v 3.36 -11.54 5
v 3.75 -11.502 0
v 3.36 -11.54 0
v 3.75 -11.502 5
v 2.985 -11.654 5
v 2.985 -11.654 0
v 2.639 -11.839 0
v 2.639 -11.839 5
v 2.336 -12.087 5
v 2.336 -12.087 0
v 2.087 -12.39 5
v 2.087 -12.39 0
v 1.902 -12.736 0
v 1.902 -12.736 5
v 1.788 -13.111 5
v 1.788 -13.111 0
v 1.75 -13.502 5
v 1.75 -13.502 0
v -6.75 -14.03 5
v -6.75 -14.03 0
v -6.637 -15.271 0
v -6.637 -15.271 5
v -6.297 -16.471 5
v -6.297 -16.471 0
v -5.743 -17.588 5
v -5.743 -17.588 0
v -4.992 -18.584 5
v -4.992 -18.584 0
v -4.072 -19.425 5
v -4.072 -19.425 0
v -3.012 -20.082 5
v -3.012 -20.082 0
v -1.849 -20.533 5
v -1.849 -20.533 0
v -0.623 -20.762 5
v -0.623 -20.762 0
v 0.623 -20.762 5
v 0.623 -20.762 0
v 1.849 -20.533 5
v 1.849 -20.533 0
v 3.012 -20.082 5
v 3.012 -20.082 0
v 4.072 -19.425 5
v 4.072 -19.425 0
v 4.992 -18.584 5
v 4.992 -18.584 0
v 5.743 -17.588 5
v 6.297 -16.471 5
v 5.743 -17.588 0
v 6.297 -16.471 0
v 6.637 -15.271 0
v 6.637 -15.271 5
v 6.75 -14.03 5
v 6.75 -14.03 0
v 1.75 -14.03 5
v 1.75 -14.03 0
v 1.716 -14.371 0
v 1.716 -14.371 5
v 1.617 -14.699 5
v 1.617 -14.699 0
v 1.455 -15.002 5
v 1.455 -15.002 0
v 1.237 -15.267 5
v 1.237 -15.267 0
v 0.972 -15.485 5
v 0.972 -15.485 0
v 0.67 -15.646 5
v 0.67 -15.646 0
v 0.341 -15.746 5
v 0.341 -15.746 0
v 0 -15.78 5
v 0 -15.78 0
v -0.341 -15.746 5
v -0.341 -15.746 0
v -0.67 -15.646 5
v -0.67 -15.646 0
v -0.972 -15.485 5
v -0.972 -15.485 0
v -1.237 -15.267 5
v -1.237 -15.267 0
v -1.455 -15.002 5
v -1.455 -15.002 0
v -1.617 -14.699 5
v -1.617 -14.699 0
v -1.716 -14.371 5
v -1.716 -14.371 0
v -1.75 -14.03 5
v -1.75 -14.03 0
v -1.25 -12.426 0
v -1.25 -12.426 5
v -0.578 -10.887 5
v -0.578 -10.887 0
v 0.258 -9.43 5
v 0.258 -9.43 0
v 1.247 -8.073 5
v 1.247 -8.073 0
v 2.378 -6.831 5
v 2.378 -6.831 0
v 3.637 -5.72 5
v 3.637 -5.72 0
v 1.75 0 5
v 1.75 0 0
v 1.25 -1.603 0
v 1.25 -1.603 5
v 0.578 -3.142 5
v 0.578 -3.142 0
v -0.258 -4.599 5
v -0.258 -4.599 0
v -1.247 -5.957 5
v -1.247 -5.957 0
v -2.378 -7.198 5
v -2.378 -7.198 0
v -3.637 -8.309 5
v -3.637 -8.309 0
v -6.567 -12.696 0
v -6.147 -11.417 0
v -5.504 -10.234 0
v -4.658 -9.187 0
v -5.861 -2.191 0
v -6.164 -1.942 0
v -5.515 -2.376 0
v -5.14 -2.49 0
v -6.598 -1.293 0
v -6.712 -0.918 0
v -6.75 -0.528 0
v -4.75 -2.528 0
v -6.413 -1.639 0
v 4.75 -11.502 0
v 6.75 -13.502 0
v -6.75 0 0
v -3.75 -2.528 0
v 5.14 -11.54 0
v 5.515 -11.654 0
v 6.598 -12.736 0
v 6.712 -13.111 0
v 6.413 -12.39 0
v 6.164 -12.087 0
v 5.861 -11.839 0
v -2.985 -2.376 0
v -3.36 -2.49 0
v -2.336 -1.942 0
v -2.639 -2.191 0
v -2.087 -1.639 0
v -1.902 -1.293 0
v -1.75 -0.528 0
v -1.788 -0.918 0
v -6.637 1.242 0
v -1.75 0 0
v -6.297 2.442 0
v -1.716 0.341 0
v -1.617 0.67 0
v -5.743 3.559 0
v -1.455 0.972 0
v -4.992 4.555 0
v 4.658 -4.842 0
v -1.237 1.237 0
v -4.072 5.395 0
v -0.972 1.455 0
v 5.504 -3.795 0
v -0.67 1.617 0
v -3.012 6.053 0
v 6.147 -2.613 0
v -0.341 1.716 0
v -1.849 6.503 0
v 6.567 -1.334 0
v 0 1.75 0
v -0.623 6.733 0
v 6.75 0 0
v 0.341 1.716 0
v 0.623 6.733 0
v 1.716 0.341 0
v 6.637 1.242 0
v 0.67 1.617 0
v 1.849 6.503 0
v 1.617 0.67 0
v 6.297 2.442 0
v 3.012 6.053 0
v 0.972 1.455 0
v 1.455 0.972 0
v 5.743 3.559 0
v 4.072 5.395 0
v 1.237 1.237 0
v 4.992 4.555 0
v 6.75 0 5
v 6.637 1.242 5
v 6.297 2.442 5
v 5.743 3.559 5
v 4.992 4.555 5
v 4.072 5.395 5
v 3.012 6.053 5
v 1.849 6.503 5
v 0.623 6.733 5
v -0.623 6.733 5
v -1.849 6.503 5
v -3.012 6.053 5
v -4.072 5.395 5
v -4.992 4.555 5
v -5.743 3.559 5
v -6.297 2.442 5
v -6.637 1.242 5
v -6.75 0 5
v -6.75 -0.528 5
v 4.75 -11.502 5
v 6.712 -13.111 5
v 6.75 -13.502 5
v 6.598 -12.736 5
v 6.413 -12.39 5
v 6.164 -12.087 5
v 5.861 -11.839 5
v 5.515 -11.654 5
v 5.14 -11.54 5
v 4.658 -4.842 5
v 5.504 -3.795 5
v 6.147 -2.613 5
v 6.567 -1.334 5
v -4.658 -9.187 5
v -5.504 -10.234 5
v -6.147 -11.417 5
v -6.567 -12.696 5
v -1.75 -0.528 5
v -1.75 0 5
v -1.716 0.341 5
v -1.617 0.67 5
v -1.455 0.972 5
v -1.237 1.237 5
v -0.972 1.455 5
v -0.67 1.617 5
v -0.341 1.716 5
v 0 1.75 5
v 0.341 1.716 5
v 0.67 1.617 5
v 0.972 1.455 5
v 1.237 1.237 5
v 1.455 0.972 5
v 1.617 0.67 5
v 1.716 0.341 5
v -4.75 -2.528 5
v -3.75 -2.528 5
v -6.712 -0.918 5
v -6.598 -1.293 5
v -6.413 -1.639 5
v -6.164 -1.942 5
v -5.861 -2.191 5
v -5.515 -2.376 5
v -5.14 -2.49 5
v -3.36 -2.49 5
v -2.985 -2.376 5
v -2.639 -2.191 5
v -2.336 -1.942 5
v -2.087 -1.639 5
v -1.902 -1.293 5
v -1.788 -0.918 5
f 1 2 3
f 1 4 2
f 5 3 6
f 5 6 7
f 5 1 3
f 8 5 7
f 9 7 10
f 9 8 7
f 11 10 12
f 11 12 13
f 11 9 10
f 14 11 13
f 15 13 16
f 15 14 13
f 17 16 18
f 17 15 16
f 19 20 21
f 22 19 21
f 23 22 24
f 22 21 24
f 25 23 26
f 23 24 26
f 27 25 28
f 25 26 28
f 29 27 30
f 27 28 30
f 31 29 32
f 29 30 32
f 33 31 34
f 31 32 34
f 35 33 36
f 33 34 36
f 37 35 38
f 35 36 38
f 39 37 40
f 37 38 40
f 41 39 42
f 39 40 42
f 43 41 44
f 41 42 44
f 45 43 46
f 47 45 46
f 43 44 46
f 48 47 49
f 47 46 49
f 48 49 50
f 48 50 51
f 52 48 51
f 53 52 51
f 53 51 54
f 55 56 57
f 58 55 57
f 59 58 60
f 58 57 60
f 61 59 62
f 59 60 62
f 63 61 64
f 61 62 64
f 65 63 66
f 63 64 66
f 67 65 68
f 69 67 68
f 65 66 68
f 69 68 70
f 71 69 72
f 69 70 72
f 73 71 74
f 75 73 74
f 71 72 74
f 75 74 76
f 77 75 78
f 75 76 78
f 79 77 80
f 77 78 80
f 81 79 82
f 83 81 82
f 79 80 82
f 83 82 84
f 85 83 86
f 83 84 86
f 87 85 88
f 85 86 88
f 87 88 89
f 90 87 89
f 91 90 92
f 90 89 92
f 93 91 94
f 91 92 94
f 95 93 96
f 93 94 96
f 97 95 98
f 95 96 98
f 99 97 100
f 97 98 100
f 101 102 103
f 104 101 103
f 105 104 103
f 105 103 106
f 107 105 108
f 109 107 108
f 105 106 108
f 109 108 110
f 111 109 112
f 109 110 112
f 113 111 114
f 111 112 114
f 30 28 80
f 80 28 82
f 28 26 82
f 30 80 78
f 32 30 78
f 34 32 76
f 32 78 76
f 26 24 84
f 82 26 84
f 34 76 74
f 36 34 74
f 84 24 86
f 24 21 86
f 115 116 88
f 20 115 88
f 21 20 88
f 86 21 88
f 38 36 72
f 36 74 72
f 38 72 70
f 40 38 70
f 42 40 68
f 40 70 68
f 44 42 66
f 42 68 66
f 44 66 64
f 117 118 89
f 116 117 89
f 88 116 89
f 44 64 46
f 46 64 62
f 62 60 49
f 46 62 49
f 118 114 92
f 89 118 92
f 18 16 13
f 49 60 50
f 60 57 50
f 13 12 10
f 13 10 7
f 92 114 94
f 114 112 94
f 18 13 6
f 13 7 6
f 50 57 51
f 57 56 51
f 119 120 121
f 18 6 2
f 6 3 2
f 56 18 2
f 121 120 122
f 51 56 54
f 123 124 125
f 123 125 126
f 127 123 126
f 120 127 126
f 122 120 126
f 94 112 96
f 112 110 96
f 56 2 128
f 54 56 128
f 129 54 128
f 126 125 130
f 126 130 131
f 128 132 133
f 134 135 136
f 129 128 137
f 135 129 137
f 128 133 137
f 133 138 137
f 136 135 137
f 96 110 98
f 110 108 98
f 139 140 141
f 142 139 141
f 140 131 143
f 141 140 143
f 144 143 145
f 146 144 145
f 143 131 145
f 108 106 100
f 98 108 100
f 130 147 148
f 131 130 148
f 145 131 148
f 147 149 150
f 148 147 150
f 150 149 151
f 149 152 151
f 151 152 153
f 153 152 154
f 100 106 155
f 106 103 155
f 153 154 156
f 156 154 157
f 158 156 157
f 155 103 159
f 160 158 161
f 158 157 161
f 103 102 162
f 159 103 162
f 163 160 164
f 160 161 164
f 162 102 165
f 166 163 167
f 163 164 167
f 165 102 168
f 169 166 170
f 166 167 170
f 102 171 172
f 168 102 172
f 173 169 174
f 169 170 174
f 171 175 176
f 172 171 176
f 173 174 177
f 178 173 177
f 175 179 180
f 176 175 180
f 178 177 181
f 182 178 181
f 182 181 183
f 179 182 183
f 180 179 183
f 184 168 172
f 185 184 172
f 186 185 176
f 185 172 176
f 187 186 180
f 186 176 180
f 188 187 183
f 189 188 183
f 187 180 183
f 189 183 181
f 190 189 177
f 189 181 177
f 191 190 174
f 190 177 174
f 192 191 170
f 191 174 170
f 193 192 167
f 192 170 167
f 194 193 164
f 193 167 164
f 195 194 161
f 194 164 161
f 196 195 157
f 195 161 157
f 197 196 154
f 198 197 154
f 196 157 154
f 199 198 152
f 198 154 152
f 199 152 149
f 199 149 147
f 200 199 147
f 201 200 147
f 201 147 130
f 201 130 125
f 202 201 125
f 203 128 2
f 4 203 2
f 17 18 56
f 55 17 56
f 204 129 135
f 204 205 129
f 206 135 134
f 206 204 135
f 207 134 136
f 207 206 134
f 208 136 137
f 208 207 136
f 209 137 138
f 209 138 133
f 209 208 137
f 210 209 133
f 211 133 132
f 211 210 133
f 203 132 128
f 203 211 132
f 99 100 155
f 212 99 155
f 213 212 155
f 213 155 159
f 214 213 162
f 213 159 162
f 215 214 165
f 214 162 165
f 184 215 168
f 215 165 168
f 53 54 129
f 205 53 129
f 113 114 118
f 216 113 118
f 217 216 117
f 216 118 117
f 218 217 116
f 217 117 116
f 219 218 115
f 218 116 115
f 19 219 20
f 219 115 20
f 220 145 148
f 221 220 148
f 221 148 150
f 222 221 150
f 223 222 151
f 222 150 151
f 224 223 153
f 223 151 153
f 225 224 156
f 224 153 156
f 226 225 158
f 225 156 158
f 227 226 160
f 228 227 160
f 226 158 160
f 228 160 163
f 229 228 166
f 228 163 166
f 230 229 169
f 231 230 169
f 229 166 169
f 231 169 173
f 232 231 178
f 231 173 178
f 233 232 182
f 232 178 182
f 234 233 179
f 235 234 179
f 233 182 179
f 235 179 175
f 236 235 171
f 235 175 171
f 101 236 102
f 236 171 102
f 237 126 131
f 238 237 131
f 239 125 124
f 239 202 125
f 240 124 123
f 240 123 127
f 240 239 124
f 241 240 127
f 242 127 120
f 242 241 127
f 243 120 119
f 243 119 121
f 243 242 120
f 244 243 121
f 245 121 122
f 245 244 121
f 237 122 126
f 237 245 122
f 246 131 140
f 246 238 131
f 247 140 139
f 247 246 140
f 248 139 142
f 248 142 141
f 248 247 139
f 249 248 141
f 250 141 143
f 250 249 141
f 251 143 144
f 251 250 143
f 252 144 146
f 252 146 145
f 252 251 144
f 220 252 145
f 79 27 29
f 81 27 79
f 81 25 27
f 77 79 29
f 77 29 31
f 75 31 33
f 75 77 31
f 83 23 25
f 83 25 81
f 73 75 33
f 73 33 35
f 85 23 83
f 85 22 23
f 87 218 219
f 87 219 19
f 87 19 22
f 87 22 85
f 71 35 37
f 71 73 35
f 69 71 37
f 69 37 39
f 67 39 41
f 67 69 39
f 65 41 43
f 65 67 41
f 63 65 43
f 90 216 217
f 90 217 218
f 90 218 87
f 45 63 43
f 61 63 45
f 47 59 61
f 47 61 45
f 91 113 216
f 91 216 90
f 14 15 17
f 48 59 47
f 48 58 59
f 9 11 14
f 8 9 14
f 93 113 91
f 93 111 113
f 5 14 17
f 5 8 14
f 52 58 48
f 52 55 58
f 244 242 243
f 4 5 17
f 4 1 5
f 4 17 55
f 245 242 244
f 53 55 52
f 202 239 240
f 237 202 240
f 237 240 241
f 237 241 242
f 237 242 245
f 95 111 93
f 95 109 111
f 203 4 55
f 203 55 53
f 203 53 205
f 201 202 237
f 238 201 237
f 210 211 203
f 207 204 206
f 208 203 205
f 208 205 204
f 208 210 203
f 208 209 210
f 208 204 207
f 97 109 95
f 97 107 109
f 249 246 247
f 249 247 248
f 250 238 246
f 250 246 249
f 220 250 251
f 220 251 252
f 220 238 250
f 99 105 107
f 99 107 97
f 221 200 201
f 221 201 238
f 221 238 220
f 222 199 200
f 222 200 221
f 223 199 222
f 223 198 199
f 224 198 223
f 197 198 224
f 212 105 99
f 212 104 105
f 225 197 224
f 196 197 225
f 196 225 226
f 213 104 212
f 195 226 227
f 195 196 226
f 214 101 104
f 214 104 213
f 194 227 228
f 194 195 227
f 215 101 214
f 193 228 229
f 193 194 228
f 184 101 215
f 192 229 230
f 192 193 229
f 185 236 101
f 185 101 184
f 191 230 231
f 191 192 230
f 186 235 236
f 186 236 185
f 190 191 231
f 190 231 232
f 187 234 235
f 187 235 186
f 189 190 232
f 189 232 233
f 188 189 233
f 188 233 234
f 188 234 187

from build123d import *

# Parameters (mm, degrees)
F1_DEPTH = 5
F2_R     = 2


with BuildPart() as f1:
    # F0 (on Top) → F1 (new body)
    with BuildSketch(Plane.XY):
        with BuildLine():
            ThreePointArc((3.63717, -5.720129), (5.85243, -3.218601), (6.75, 0))
            ThreePointArc((6.75, 0), (0, 6.761681), (-6.75, 0))
            Line((-6.75, 0), (-6.75, -2.528022))
            Line((-6.75, -2.528022), (-1.75, -2.528022))
            Line((-1.75, -2.528022), (-1.75, 0))
            ThreePointArc((-1.75, 0), (0, 1.75), (1.75, 0))
            ThreePointArc((1.75, 0), (-0.257619, -4.599435), (-3.63717, -8.309419))
            ThreePointArc((-3.63717, -8.309419), (-5.85243, -10.810947), (-6.75, -14.029548))
            ThreePointArc((-6.75, -14.029548), (0, -20.791229), (6.75, -14.029548))
            Line((6.75, -14.029548), (6.75, -11.501526))
            Line((6.75, -11.501526), (1.75, -11.501526))
            Line((1.75, -11.501526), (1.75, -14.029548))
            ThreePointArc((1.75, -14.029548), (0, -15.779548), (-1.75, -14.029548))
            ThreePointArc((-1.75, -14.029548), (0.257619, -9.430112), (3.63717, -5.720129))
        make_face()
    extrude(amount=F1_DEPTH)

    # F2
    f2_edges = [f1.edges().sort_by_distance(p)[0] for p in [
        (-6.75, -2.528022, 2.5),
        (6.75, -11.501526, 2.5),
        (1.75, -11.501526, 2.5),
        (-1.75, -2.528022, 2.5),
    ]]
    fillet(f2_edges, radius=F2_R)


solid = f1.part
